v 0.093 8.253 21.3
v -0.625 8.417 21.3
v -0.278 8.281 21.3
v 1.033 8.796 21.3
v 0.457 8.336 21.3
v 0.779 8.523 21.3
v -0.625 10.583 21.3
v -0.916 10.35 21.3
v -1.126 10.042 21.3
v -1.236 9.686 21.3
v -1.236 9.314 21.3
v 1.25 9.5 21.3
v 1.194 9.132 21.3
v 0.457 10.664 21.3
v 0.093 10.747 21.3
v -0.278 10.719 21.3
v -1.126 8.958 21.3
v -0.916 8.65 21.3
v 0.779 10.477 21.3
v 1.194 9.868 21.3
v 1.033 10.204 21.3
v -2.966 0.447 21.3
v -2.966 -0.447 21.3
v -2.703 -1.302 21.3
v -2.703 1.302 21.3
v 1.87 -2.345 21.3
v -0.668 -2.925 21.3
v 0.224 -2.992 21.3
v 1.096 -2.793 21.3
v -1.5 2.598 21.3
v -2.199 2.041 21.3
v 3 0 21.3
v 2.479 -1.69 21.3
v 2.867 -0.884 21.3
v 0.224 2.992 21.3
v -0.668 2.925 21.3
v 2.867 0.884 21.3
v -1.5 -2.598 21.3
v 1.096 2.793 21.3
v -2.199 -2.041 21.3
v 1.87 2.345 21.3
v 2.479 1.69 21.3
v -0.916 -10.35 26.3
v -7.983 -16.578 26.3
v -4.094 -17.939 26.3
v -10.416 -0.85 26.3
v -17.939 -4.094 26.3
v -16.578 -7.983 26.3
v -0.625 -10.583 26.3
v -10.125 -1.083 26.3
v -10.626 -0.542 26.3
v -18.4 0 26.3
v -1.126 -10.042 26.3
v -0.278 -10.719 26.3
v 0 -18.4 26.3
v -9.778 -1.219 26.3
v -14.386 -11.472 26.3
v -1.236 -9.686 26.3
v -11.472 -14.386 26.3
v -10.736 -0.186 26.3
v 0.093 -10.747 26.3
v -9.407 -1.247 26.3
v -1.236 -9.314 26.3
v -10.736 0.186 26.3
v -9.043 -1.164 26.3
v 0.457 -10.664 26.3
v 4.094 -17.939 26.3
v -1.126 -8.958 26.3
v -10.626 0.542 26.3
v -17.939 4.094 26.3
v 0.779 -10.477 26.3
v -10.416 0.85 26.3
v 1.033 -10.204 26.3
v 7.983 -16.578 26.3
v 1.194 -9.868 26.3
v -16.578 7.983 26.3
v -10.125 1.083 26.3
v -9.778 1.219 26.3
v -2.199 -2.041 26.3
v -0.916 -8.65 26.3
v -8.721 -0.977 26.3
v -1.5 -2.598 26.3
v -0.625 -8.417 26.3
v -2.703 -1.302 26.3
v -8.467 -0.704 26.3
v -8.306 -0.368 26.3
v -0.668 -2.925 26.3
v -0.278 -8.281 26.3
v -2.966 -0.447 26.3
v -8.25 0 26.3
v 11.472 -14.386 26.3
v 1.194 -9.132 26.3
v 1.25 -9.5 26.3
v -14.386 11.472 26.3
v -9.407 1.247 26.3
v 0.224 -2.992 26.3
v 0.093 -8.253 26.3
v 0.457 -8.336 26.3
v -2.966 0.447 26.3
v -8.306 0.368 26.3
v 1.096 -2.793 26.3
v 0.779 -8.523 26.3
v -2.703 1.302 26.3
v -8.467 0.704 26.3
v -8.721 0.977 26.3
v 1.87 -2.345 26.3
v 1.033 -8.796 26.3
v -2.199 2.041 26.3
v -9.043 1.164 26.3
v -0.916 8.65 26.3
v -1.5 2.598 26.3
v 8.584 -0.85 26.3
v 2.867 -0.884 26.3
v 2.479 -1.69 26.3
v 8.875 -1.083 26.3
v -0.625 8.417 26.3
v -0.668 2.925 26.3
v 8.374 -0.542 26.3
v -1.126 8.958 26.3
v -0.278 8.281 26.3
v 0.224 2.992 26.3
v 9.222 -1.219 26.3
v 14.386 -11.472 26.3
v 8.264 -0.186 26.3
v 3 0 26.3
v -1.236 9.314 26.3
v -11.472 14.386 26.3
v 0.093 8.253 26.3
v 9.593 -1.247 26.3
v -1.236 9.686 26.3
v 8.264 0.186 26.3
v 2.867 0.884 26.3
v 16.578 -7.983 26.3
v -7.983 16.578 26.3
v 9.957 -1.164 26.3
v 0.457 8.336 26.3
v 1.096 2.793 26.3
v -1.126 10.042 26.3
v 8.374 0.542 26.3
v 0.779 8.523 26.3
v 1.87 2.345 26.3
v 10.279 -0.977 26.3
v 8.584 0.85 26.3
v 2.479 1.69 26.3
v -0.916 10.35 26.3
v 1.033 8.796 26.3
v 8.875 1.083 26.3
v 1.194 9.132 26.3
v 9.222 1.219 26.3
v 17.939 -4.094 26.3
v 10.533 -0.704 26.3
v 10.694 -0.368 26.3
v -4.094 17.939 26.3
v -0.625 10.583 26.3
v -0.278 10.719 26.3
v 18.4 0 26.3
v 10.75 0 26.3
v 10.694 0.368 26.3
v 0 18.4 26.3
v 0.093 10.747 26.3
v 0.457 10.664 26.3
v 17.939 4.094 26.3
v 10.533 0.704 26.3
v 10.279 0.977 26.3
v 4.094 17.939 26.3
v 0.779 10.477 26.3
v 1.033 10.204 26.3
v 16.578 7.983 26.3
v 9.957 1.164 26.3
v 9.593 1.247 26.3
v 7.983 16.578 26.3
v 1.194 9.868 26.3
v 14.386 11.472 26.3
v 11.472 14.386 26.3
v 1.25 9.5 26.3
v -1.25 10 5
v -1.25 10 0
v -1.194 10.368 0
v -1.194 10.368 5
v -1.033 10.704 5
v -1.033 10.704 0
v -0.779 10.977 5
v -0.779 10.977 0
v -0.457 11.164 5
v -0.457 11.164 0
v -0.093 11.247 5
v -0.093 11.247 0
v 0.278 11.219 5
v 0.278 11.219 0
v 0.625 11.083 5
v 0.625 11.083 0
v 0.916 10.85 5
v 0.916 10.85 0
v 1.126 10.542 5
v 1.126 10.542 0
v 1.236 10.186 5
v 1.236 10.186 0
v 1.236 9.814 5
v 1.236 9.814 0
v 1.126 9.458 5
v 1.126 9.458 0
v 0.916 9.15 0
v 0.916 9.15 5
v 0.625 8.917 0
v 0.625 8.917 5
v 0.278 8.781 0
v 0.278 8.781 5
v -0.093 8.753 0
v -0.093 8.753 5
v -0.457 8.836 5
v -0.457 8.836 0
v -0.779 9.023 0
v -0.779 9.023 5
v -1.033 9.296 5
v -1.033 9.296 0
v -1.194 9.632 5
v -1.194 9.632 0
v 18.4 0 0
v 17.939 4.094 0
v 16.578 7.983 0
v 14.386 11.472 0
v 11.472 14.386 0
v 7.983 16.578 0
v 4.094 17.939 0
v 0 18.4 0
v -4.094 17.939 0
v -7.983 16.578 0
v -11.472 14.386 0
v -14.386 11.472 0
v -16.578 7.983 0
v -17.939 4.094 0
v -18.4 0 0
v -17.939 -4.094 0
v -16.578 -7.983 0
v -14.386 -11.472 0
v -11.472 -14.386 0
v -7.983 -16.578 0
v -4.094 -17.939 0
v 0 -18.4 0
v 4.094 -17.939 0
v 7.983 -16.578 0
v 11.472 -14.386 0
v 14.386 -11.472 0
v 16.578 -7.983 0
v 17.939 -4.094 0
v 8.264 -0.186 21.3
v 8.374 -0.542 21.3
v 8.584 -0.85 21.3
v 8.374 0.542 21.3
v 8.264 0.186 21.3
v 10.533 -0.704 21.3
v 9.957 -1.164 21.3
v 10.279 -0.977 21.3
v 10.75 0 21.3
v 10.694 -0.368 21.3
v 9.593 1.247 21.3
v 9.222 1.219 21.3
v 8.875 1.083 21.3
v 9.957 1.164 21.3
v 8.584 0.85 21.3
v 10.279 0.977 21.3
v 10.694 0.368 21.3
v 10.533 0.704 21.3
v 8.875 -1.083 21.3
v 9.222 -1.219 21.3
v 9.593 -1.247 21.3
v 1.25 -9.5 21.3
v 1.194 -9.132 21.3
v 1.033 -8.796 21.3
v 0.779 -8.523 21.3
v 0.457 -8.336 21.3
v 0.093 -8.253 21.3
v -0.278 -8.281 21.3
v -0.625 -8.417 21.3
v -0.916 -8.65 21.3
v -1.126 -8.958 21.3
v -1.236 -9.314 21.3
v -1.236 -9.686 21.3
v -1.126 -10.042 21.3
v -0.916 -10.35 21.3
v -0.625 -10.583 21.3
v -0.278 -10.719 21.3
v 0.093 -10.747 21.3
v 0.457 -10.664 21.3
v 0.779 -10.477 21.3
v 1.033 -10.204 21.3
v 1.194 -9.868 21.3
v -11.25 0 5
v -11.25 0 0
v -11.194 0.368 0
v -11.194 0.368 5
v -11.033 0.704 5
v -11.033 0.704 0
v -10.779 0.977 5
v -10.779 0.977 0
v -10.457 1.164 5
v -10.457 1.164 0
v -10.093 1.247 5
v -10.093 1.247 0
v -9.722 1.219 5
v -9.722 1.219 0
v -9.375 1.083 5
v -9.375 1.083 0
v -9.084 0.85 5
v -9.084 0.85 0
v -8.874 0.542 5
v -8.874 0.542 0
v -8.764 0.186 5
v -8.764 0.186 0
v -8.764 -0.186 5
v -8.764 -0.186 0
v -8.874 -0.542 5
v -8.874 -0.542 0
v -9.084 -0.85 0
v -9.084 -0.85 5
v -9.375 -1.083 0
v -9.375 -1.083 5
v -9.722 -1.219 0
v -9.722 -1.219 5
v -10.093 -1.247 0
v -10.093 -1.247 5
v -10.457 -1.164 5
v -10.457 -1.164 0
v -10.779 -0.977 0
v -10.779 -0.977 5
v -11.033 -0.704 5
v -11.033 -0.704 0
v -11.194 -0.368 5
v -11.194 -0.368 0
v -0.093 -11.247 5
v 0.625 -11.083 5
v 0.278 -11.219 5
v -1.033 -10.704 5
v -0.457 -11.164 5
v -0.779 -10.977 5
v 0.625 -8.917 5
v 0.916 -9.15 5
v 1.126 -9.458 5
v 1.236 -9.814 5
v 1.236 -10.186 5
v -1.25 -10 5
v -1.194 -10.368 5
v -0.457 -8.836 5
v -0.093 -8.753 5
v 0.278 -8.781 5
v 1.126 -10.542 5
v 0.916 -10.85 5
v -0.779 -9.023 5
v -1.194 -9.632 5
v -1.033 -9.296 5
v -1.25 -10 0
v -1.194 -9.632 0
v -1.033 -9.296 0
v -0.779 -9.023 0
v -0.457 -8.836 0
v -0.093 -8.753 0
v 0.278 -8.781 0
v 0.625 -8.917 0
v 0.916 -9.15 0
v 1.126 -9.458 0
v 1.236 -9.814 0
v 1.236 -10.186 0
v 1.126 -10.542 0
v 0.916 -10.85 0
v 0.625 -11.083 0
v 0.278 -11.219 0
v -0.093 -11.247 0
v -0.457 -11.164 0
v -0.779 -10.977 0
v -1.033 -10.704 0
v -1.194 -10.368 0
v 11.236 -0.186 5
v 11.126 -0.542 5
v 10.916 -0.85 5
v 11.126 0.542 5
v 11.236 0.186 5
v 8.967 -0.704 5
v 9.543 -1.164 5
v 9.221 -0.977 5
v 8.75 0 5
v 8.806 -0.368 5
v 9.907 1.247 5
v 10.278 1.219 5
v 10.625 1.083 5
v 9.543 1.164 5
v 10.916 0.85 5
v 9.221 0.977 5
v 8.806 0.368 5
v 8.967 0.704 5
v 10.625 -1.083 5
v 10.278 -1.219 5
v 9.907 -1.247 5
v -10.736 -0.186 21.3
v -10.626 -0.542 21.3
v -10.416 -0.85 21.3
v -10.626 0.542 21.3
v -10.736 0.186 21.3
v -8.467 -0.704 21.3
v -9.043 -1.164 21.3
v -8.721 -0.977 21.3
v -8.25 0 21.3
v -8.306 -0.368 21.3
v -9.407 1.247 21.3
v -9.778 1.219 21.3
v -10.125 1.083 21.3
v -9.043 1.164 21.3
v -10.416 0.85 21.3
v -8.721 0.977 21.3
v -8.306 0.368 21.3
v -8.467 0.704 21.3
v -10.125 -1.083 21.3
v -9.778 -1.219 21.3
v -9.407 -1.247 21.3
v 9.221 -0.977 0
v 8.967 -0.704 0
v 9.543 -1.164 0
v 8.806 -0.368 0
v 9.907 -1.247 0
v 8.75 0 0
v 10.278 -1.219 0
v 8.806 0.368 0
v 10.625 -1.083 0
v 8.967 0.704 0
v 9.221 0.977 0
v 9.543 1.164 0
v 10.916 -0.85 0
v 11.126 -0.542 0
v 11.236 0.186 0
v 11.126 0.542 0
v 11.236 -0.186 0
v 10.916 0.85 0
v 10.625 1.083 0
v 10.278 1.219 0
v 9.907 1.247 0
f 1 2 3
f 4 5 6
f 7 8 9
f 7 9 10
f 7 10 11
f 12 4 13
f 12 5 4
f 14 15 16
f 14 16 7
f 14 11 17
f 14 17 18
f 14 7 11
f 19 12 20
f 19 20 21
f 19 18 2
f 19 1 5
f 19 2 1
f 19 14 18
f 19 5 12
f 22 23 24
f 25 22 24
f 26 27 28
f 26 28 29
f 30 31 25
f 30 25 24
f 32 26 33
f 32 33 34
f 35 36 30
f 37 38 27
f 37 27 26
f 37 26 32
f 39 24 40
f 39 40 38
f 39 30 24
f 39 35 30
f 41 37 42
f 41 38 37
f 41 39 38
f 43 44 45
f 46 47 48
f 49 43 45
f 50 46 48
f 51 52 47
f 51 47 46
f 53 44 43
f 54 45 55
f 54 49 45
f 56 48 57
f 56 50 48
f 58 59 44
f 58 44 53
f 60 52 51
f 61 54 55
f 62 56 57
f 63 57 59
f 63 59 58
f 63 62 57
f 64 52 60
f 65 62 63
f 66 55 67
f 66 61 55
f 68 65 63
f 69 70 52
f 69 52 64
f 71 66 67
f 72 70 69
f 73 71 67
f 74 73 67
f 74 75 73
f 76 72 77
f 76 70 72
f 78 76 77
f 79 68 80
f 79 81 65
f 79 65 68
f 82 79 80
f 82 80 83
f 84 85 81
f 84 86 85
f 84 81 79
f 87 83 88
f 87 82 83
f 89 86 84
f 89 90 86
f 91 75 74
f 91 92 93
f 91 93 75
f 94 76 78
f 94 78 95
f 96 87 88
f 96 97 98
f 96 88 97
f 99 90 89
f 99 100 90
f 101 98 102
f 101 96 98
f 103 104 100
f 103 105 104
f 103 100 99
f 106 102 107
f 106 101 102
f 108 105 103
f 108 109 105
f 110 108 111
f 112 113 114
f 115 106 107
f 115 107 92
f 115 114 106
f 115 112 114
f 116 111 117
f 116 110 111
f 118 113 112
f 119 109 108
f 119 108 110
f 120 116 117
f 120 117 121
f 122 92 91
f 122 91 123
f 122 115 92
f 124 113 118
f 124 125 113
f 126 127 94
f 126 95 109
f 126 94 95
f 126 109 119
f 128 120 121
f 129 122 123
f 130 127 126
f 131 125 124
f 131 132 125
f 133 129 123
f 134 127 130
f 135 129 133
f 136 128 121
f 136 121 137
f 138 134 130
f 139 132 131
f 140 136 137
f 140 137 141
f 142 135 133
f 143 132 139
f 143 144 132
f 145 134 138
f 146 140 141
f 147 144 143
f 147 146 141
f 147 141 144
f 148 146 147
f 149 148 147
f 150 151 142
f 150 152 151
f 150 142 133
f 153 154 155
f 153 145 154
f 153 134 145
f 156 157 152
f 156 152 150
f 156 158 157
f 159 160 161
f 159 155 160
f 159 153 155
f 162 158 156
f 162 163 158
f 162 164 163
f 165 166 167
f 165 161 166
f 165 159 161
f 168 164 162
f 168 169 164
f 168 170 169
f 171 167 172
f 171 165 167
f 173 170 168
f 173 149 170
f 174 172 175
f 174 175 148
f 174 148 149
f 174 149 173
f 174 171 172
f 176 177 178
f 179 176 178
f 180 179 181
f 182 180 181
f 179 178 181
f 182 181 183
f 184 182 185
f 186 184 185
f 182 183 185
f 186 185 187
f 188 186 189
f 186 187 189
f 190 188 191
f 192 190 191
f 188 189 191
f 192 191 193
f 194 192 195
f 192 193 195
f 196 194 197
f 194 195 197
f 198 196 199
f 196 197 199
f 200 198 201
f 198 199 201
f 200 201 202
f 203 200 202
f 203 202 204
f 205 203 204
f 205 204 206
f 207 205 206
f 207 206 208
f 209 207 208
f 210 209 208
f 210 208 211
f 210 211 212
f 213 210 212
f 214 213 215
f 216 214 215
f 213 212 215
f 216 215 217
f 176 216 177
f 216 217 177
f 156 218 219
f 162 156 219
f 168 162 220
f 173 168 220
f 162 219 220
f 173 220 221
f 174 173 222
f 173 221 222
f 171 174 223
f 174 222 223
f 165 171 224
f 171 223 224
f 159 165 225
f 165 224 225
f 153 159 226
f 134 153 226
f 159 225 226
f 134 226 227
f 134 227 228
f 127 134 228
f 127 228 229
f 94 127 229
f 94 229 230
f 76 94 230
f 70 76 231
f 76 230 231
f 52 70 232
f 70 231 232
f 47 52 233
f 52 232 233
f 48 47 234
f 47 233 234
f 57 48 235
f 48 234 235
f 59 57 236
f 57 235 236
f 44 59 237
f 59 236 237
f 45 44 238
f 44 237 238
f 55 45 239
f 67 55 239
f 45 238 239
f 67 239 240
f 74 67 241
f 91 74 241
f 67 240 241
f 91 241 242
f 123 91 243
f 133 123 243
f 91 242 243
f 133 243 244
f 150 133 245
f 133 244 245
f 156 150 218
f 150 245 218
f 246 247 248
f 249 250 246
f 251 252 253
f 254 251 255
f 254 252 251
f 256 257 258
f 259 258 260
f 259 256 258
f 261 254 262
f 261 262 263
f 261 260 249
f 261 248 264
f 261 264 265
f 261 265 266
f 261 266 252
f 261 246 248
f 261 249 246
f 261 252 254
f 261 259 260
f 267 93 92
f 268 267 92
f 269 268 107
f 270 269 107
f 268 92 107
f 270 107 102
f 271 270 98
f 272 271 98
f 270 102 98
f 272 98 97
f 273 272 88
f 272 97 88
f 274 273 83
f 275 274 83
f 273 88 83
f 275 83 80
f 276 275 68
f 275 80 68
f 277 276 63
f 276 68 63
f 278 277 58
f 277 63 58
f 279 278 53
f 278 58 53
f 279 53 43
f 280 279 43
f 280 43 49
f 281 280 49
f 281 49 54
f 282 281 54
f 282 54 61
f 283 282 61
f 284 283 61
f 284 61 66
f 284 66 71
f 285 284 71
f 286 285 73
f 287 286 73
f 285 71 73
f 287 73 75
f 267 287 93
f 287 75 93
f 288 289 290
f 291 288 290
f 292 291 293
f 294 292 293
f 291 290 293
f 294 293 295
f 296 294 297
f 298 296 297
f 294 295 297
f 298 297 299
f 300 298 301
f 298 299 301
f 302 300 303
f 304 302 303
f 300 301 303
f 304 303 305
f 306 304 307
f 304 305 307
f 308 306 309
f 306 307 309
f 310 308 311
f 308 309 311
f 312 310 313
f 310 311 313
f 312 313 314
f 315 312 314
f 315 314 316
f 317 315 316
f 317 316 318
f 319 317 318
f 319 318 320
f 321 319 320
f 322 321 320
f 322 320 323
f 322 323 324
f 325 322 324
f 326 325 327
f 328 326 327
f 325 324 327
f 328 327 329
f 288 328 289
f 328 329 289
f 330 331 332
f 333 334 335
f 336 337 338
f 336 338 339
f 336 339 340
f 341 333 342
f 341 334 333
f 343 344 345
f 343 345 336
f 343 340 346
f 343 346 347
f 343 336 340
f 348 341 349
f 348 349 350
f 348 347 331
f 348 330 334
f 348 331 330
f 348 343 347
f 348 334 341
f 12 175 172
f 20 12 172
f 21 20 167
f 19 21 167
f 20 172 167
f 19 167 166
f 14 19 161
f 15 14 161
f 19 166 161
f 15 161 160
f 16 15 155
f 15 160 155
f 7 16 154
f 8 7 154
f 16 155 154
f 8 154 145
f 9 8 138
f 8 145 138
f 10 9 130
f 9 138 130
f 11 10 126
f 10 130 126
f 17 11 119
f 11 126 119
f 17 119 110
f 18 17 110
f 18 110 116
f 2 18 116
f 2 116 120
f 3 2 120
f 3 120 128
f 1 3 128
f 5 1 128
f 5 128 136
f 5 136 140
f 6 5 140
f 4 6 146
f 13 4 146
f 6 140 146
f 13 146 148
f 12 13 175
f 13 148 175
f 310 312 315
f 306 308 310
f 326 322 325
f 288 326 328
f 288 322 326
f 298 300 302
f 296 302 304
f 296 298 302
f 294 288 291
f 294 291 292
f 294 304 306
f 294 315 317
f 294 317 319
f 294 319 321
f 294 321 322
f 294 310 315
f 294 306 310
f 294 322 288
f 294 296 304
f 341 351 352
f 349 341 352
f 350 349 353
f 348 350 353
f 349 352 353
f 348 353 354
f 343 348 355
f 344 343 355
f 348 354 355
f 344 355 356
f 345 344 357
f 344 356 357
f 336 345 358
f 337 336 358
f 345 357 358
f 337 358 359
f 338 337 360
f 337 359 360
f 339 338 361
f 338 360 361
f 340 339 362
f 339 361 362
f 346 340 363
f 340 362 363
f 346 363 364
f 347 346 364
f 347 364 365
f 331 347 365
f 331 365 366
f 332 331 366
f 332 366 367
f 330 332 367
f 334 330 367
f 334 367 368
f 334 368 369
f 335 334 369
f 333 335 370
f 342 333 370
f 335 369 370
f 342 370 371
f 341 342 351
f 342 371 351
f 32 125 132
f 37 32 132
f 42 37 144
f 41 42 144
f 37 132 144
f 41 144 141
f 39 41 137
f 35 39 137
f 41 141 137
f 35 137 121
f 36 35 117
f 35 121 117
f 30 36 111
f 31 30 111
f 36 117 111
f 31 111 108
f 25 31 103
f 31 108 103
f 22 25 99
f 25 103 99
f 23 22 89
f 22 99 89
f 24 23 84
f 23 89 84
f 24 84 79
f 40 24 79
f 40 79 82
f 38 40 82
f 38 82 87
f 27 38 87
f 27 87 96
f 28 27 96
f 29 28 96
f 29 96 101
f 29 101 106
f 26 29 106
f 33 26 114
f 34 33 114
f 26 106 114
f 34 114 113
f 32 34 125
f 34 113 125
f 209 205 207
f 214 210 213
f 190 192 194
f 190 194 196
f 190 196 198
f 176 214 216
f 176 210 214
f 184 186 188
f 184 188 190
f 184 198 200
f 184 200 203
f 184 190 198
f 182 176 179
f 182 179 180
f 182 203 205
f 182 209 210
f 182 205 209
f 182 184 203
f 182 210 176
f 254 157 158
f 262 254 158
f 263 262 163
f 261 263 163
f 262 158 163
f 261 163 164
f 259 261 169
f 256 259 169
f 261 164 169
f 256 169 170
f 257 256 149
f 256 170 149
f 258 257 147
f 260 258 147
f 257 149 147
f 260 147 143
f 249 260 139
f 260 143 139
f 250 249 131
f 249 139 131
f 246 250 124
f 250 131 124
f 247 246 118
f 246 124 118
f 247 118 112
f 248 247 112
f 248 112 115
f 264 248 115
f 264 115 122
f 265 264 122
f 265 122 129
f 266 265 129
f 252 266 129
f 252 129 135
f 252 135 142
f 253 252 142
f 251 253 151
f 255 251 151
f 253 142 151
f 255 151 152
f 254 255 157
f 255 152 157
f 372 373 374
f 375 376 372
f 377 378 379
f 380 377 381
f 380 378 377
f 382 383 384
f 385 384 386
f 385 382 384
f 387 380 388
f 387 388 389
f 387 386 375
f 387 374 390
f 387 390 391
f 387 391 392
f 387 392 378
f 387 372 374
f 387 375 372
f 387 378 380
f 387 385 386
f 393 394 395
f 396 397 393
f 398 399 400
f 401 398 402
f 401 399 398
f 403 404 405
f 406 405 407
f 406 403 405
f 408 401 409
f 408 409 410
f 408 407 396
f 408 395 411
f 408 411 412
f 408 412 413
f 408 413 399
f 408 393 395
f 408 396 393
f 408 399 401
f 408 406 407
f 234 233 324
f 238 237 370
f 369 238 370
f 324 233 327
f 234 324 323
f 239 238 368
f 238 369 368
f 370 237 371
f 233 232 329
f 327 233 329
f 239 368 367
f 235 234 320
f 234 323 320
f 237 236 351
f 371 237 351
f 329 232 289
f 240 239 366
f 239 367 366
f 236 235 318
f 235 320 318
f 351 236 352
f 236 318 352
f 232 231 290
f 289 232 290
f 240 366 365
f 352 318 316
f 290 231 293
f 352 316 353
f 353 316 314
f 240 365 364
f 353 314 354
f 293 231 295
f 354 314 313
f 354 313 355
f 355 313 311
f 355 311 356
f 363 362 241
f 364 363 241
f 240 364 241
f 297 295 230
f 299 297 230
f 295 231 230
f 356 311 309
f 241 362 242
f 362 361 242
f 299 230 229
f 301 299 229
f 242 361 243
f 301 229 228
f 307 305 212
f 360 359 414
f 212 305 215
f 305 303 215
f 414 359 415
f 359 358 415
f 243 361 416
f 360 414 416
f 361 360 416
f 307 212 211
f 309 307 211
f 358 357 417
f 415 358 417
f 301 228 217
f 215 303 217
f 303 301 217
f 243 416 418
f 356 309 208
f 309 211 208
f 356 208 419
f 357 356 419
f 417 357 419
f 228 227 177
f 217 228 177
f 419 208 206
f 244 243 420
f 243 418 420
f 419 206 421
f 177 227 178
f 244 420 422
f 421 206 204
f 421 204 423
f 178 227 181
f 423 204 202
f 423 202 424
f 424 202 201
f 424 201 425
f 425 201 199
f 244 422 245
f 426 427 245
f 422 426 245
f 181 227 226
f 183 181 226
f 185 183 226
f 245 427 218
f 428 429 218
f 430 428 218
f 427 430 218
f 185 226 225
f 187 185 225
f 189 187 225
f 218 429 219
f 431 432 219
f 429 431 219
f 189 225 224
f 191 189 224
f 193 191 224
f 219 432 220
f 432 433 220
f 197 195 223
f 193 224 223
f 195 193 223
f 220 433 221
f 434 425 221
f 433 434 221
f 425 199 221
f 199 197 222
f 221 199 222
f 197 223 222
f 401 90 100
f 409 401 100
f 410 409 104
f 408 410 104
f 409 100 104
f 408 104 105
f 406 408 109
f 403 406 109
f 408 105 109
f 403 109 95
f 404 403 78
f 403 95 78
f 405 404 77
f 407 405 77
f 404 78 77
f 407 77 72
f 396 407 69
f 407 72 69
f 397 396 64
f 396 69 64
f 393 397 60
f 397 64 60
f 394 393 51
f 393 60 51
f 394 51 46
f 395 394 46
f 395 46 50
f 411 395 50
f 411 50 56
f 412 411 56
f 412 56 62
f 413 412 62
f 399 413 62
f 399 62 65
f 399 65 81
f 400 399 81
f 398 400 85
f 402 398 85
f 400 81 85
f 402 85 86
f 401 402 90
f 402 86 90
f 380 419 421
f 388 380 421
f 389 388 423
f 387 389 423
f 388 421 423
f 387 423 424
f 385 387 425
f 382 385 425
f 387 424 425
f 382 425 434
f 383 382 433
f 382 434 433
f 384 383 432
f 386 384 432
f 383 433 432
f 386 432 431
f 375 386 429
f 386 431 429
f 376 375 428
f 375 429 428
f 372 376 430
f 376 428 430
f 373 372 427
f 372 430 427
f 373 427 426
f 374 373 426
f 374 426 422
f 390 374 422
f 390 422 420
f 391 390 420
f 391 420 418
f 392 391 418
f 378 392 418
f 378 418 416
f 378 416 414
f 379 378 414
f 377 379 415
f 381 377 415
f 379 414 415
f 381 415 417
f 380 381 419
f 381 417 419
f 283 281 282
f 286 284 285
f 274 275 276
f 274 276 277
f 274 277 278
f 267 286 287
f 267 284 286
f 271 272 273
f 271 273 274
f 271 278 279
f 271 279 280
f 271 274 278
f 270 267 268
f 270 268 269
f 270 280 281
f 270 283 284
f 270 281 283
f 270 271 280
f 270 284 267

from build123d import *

# Parameters (mm, degrees)
CROQUIS1_R              = 18.4
SALIENTE_EXTRUIR1_DEPTH = 26.3
CROQUIS2_R              = 3
CROQUIS2_R_2            = 1.25
CORTAR_EXTRUIR1_DEPTH   = 5
CROQUIS3_R              = 1.25
CORTAR_EXTRUIR2_DEPTH   = 5


with BuildPart() as part:
    # Croquis1 → Saliente-Extruir1 (new body)
    with BuildSketch(Plane.XY):
        Circle(CROQUIS1_R)
    extrude(amount=SALIENTE_EXTRUIR1_DEPTH)

    # Croquis2 → Cortar-Extruir1 (cut)
    with BuildSketch(Plane.XY.offset(26.3)):
        Circle(CROQUIS2_R)
        with Locations((0, 9.5)):
            Circle(CROQUIS2_R_2)
        with Locations((9.5, 0)):
            Circle(CROQUIS2_R_2)
        with Locations((0, -9.5)):
            Circle(CROQUIS2_R_2)
        with Locations((-9.5, 0)):
            Circle(CROQUIS2_R_2)
    extrude(amount=-CORTAR_EXTRUIR1_DEPTH, mode=Mode.SUBTRACT)

    # Croquis3 → Cortar-Extruir2 (cut)
    with BuildSketch(Plane(origin=(0, 0, 0), x_dir=(-1, 0, 0), z_dir=(0, 0, -1))):
        with Locations((-10, 0)):
            Circle(CROQUIS3_R)
        with Locations((0, 10)):
            Circle(CROQUIS3_R)
        with Locations((10, 0)):
            Circle(CROQUIS3_R)
        with Locations((0, -10)):
            Circle(CROQUIS3_R)
    extrude(amount=-CORTAR_EXTRUIR2_DEPTH, mode=Mode.SUBTRACT)


solid = part.part
